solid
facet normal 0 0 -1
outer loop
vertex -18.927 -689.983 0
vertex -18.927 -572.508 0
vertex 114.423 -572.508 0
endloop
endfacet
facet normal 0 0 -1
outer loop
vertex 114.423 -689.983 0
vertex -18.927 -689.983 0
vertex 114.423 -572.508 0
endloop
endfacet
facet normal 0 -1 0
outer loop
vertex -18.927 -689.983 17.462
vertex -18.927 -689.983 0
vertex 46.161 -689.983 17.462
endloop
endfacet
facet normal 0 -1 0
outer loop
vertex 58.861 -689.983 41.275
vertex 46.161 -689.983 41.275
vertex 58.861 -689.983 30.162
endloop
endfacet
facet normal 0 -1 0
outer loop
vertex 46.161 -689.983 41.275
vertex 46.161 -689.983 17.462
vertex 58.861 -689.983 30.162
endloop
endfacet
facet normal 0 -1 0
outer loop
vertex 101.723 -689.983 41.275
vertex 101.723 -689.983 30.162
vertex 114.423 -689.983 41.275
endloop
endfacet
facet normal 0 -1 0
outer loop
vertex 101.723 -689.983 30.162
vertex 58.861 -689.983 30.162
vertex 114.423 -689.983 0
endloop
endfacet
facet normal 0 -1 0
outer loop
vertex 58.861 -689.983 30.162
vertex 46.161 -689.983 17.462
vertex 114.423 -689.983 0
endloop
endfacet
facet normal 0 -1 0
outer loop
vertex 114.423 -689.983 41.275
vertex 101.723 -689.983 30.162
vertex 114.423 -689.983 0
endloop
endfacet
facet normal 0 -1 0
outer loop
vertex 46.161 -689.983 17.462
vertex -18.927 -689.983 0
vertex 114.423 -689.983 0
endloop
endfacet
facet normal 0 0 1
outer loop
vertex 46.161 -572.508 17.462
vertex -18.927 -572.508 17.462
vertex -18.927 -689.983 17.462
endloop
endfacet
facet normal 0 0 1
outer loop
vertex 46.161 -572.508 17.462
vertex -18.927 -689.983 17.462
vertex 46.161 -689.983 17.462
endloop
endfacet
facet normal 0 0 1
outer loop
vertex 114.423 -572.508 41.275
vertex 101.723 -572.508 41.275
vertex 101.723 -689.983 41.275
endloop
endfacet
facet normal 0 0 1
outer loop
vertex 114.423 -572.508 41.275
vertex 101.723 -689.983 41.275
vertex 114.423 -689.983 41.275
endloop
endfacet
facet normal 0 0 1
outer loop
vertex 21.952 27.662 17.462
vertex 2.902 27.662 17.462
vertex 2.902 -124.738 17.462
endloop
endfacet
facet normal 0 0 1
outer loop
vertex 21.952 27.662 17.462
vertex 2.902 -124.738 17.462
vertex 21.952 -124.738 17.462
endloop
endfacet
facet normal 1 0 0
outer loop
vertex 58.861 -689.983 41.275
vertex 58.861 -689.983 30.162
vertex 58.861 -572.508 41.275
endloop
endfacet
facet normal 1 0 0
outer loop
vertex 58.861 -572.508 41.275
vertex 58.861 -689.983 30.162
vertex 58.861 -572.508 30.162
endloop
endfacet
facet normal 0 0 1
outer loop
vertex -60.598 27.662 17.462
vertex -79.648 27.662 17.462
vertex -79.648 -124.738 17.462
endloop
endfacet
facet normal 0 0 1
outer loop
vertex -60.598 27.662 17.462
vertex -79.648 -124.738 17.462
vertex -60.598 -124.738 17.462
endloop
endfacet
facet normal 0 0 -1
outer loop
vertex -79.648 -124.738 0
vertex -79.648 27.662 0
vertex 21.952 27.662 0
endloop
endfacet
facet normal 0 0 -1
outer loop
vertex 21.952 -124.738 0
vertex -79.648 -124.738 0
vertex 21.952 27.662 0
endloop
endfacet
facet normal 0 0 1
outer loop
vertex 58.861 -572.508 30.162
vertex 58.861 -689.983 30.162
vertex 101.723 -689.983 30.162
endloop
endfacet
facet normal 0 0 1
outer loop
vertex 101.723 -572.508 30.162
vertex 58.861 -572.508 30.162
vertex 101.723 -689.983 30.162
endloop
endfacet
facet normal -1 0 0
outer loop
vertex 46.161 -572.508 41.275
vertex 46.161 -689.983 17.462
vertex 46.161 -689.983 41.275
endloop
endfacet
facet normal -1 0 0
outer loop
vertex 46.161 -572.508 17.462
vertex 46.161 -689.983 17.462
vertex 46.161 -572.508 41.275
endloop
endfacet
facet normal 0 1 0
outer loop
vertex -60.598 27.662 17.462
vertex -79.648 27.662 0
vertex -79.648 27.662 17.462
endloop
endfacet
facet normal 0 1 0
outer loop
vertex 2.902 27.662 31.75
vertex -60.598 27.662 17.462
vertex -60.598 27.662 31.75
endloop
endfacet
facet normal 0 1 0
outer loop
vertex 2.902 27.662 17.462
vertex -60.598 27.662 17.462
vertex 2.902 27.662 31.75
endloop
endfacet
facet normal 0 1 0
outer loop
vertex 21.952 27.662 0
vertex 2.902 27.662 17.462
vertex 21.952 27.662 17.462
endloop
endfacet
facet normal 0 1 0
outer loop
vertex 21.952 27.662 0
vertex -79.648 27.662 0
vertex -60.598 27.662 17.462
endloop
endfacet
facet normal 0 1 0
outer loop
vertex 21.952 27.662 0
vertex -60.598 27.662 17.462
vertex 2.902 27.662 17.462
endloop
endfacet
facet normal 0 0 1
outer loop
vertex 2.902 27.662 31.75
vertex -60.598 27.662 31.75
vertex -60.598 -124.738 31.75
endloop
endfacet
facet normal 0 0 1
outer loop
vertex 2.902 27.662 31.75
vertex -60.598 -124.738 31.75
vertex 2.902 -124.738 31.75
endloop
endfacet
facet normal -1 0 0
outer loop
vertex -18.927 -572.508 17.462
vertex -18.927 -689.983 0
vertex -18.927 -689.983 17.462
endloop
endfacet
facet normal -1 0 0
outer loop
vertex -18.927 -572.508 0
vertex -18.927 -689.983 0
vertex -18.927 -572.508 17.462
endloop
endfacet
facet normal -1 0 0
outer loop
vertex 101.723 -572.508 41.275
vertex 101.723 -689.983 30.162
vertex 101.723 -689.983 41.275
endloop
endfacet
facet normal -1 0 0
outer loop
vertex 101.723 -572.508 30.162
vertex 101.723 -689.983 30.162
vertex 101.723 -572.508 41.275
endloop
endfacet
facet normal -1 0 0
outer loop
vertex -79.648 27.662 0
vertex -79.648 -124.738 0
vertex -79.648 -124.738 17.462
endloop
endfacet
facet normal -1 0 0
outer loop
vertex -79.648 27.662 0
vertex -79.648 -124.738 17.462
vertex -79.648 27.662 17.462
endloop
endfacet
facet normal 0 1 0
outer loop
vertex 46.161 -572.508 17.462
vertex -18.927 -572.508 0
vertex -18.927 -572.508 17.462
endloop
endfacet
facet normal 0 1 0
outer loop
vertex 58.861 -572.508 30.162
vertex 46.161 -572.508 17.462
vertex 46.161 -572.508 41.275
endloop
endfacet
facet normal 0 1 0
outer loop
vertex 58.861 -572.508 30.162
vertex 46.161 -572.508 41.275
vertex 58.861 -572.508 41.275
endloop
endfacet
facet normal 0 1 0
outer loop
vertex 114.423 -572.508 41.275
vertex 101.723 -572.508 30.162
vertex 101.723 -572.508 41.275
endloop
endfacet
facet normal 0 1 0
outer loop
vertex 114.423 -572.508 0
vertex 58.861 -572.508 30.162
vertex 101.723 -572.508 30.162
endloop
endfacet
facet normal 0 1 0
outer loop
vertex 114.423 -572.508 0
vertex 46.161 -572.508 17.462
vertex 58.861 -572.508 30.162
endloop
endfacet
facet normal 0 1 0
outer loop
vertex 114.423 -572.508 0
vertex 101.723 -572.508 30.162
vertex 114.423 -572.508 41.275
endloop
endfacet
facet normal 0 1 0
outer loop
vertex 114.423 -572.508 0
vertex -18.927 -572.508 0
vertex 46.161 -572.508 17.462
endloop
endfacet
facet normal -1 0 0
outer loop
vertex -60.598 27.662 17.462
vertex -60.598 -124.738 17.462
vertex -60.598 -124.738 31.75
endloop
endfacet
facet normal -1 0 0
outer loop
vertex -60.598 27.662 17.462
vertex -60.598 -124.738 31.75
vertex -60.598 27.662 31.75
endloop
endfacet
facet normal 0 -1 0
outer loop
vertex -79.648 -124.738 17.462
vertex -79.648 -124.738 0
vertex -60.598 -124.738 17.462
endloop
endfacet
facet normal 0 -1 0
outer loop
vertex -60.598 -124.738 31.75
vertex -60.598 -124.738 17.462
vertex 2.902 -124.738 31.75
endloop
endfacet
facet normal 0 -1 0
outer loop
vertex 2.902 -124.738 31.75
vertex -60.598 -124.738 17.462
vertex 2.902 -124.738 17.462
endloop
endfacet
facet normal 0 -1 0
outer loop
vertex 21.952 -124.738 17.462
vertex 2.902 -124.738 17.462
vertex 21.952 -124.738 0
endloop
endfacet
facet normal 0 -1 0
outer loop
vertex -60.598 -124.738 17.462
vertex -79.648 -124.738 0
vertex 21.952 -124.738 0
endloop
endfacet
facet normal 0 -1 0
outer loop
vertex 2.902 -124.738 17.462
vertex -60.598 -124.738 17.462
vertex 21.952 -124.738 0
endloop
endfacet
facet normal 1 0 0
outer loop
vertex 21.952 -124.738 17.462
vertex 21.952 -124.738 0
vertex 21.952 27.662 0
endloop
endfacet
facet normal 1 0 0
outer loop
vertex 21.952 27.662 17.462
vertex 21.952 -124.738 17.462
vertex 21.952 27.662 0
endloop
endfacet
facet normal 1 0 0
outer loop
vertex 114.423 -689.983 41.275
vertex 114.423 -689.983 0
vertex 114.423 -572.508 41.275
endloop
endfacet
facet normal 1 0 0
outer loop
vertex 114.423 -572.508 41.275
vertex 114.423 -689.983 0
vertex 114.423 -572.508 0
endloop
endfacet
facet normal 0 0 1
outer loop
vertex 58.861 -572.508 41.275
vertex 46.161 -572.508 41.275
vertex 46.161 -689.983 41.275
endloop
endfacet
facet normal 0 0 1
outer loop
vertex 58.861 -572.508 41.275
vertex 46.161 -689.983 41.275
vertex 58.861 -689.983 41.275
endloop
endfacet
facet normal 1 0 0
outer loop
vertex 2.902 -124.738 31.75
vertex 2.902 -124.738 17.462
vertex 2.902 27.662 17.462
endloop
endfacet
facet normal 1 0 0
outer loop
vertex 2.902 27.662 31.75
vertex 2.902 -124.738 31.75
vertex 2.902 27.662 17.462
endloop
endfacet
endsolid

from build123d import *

# Parameters (mm, degrees)
F0_W     = 101.6
F0_H     = 152.4
F1_DEPTH = 15.875
F3_DEPTH = 17.4625
F0_W_2   = 133.35
F0_H_2   = 117.475
F4_W     = 68.2625
F4_H     = 117.475
F5_DEPTH = 12.7
F6_W     = 12.7
F6_H     = 117.475
F7_DEPTH = 11.1125
F2_W     = 63.5
F2_H     = 152.4
F8_DEPTH = 15.875


with BuildPart() as f1:
    # F0 (on Top) → F1 (new body)
    with BuildSketch(Plane.XY):
        with Locations((-28.8477124095, -48.5382462025)):
            Rectangle(F0_W, F0_H)
    extrude(amount=F1_DEPTH)

    # F0 (on Top) → F3 (join)
    with BuildSketch(Plane.XY):
        with Locations((-28.8477124095, -48.5382462025)):
            Rectangle(F0_W, F0_H)
    extrude(amount=F3_DEPTH)

    # F2 (on face) → F8 (join)
    with BuildSketch(Plane.XY.offset(15.875)):
        with Locations((-28.8477124095, -48.5382462025)):
            Rectangle(F2_W, F2_H)
    extrude(amount=F8_DEPTH)


with BuildPart() as f3:
    # F0 (on Top) → F3, piece 2 (new body)
    with BuildSketch(Plane.XY):
        with Locations((47.7483122468, -631.2457487106)):
            Rectangle(F0_W_2, F0_H_2)
    extrude(amount=F3_DEPTH)

    # F4 (on face) → F5 (join)
    with BuildSketch(Plane.XY.offset(17.4625)):
        with Locations((80.2920622468, -631.2457487106)):
            Rectangle(F4_W, F4_H)
    extrude(amount=F5_DEPTH)

    # F6 (on face) → F7 (join)
    with BuildSketch(Plane.XY.offset(30.1625)):
        with Locations((52.5108122468, -631.2457487106)):
            Rectangle(F6_W, F6_H)
        with Locations((108.0733122468, -631.2457487106)):
            Rectangle(F6_W, F6_H)
    extrude(amount=F7_DEPTH)


solid = Compound([f1.part, f3.part])
